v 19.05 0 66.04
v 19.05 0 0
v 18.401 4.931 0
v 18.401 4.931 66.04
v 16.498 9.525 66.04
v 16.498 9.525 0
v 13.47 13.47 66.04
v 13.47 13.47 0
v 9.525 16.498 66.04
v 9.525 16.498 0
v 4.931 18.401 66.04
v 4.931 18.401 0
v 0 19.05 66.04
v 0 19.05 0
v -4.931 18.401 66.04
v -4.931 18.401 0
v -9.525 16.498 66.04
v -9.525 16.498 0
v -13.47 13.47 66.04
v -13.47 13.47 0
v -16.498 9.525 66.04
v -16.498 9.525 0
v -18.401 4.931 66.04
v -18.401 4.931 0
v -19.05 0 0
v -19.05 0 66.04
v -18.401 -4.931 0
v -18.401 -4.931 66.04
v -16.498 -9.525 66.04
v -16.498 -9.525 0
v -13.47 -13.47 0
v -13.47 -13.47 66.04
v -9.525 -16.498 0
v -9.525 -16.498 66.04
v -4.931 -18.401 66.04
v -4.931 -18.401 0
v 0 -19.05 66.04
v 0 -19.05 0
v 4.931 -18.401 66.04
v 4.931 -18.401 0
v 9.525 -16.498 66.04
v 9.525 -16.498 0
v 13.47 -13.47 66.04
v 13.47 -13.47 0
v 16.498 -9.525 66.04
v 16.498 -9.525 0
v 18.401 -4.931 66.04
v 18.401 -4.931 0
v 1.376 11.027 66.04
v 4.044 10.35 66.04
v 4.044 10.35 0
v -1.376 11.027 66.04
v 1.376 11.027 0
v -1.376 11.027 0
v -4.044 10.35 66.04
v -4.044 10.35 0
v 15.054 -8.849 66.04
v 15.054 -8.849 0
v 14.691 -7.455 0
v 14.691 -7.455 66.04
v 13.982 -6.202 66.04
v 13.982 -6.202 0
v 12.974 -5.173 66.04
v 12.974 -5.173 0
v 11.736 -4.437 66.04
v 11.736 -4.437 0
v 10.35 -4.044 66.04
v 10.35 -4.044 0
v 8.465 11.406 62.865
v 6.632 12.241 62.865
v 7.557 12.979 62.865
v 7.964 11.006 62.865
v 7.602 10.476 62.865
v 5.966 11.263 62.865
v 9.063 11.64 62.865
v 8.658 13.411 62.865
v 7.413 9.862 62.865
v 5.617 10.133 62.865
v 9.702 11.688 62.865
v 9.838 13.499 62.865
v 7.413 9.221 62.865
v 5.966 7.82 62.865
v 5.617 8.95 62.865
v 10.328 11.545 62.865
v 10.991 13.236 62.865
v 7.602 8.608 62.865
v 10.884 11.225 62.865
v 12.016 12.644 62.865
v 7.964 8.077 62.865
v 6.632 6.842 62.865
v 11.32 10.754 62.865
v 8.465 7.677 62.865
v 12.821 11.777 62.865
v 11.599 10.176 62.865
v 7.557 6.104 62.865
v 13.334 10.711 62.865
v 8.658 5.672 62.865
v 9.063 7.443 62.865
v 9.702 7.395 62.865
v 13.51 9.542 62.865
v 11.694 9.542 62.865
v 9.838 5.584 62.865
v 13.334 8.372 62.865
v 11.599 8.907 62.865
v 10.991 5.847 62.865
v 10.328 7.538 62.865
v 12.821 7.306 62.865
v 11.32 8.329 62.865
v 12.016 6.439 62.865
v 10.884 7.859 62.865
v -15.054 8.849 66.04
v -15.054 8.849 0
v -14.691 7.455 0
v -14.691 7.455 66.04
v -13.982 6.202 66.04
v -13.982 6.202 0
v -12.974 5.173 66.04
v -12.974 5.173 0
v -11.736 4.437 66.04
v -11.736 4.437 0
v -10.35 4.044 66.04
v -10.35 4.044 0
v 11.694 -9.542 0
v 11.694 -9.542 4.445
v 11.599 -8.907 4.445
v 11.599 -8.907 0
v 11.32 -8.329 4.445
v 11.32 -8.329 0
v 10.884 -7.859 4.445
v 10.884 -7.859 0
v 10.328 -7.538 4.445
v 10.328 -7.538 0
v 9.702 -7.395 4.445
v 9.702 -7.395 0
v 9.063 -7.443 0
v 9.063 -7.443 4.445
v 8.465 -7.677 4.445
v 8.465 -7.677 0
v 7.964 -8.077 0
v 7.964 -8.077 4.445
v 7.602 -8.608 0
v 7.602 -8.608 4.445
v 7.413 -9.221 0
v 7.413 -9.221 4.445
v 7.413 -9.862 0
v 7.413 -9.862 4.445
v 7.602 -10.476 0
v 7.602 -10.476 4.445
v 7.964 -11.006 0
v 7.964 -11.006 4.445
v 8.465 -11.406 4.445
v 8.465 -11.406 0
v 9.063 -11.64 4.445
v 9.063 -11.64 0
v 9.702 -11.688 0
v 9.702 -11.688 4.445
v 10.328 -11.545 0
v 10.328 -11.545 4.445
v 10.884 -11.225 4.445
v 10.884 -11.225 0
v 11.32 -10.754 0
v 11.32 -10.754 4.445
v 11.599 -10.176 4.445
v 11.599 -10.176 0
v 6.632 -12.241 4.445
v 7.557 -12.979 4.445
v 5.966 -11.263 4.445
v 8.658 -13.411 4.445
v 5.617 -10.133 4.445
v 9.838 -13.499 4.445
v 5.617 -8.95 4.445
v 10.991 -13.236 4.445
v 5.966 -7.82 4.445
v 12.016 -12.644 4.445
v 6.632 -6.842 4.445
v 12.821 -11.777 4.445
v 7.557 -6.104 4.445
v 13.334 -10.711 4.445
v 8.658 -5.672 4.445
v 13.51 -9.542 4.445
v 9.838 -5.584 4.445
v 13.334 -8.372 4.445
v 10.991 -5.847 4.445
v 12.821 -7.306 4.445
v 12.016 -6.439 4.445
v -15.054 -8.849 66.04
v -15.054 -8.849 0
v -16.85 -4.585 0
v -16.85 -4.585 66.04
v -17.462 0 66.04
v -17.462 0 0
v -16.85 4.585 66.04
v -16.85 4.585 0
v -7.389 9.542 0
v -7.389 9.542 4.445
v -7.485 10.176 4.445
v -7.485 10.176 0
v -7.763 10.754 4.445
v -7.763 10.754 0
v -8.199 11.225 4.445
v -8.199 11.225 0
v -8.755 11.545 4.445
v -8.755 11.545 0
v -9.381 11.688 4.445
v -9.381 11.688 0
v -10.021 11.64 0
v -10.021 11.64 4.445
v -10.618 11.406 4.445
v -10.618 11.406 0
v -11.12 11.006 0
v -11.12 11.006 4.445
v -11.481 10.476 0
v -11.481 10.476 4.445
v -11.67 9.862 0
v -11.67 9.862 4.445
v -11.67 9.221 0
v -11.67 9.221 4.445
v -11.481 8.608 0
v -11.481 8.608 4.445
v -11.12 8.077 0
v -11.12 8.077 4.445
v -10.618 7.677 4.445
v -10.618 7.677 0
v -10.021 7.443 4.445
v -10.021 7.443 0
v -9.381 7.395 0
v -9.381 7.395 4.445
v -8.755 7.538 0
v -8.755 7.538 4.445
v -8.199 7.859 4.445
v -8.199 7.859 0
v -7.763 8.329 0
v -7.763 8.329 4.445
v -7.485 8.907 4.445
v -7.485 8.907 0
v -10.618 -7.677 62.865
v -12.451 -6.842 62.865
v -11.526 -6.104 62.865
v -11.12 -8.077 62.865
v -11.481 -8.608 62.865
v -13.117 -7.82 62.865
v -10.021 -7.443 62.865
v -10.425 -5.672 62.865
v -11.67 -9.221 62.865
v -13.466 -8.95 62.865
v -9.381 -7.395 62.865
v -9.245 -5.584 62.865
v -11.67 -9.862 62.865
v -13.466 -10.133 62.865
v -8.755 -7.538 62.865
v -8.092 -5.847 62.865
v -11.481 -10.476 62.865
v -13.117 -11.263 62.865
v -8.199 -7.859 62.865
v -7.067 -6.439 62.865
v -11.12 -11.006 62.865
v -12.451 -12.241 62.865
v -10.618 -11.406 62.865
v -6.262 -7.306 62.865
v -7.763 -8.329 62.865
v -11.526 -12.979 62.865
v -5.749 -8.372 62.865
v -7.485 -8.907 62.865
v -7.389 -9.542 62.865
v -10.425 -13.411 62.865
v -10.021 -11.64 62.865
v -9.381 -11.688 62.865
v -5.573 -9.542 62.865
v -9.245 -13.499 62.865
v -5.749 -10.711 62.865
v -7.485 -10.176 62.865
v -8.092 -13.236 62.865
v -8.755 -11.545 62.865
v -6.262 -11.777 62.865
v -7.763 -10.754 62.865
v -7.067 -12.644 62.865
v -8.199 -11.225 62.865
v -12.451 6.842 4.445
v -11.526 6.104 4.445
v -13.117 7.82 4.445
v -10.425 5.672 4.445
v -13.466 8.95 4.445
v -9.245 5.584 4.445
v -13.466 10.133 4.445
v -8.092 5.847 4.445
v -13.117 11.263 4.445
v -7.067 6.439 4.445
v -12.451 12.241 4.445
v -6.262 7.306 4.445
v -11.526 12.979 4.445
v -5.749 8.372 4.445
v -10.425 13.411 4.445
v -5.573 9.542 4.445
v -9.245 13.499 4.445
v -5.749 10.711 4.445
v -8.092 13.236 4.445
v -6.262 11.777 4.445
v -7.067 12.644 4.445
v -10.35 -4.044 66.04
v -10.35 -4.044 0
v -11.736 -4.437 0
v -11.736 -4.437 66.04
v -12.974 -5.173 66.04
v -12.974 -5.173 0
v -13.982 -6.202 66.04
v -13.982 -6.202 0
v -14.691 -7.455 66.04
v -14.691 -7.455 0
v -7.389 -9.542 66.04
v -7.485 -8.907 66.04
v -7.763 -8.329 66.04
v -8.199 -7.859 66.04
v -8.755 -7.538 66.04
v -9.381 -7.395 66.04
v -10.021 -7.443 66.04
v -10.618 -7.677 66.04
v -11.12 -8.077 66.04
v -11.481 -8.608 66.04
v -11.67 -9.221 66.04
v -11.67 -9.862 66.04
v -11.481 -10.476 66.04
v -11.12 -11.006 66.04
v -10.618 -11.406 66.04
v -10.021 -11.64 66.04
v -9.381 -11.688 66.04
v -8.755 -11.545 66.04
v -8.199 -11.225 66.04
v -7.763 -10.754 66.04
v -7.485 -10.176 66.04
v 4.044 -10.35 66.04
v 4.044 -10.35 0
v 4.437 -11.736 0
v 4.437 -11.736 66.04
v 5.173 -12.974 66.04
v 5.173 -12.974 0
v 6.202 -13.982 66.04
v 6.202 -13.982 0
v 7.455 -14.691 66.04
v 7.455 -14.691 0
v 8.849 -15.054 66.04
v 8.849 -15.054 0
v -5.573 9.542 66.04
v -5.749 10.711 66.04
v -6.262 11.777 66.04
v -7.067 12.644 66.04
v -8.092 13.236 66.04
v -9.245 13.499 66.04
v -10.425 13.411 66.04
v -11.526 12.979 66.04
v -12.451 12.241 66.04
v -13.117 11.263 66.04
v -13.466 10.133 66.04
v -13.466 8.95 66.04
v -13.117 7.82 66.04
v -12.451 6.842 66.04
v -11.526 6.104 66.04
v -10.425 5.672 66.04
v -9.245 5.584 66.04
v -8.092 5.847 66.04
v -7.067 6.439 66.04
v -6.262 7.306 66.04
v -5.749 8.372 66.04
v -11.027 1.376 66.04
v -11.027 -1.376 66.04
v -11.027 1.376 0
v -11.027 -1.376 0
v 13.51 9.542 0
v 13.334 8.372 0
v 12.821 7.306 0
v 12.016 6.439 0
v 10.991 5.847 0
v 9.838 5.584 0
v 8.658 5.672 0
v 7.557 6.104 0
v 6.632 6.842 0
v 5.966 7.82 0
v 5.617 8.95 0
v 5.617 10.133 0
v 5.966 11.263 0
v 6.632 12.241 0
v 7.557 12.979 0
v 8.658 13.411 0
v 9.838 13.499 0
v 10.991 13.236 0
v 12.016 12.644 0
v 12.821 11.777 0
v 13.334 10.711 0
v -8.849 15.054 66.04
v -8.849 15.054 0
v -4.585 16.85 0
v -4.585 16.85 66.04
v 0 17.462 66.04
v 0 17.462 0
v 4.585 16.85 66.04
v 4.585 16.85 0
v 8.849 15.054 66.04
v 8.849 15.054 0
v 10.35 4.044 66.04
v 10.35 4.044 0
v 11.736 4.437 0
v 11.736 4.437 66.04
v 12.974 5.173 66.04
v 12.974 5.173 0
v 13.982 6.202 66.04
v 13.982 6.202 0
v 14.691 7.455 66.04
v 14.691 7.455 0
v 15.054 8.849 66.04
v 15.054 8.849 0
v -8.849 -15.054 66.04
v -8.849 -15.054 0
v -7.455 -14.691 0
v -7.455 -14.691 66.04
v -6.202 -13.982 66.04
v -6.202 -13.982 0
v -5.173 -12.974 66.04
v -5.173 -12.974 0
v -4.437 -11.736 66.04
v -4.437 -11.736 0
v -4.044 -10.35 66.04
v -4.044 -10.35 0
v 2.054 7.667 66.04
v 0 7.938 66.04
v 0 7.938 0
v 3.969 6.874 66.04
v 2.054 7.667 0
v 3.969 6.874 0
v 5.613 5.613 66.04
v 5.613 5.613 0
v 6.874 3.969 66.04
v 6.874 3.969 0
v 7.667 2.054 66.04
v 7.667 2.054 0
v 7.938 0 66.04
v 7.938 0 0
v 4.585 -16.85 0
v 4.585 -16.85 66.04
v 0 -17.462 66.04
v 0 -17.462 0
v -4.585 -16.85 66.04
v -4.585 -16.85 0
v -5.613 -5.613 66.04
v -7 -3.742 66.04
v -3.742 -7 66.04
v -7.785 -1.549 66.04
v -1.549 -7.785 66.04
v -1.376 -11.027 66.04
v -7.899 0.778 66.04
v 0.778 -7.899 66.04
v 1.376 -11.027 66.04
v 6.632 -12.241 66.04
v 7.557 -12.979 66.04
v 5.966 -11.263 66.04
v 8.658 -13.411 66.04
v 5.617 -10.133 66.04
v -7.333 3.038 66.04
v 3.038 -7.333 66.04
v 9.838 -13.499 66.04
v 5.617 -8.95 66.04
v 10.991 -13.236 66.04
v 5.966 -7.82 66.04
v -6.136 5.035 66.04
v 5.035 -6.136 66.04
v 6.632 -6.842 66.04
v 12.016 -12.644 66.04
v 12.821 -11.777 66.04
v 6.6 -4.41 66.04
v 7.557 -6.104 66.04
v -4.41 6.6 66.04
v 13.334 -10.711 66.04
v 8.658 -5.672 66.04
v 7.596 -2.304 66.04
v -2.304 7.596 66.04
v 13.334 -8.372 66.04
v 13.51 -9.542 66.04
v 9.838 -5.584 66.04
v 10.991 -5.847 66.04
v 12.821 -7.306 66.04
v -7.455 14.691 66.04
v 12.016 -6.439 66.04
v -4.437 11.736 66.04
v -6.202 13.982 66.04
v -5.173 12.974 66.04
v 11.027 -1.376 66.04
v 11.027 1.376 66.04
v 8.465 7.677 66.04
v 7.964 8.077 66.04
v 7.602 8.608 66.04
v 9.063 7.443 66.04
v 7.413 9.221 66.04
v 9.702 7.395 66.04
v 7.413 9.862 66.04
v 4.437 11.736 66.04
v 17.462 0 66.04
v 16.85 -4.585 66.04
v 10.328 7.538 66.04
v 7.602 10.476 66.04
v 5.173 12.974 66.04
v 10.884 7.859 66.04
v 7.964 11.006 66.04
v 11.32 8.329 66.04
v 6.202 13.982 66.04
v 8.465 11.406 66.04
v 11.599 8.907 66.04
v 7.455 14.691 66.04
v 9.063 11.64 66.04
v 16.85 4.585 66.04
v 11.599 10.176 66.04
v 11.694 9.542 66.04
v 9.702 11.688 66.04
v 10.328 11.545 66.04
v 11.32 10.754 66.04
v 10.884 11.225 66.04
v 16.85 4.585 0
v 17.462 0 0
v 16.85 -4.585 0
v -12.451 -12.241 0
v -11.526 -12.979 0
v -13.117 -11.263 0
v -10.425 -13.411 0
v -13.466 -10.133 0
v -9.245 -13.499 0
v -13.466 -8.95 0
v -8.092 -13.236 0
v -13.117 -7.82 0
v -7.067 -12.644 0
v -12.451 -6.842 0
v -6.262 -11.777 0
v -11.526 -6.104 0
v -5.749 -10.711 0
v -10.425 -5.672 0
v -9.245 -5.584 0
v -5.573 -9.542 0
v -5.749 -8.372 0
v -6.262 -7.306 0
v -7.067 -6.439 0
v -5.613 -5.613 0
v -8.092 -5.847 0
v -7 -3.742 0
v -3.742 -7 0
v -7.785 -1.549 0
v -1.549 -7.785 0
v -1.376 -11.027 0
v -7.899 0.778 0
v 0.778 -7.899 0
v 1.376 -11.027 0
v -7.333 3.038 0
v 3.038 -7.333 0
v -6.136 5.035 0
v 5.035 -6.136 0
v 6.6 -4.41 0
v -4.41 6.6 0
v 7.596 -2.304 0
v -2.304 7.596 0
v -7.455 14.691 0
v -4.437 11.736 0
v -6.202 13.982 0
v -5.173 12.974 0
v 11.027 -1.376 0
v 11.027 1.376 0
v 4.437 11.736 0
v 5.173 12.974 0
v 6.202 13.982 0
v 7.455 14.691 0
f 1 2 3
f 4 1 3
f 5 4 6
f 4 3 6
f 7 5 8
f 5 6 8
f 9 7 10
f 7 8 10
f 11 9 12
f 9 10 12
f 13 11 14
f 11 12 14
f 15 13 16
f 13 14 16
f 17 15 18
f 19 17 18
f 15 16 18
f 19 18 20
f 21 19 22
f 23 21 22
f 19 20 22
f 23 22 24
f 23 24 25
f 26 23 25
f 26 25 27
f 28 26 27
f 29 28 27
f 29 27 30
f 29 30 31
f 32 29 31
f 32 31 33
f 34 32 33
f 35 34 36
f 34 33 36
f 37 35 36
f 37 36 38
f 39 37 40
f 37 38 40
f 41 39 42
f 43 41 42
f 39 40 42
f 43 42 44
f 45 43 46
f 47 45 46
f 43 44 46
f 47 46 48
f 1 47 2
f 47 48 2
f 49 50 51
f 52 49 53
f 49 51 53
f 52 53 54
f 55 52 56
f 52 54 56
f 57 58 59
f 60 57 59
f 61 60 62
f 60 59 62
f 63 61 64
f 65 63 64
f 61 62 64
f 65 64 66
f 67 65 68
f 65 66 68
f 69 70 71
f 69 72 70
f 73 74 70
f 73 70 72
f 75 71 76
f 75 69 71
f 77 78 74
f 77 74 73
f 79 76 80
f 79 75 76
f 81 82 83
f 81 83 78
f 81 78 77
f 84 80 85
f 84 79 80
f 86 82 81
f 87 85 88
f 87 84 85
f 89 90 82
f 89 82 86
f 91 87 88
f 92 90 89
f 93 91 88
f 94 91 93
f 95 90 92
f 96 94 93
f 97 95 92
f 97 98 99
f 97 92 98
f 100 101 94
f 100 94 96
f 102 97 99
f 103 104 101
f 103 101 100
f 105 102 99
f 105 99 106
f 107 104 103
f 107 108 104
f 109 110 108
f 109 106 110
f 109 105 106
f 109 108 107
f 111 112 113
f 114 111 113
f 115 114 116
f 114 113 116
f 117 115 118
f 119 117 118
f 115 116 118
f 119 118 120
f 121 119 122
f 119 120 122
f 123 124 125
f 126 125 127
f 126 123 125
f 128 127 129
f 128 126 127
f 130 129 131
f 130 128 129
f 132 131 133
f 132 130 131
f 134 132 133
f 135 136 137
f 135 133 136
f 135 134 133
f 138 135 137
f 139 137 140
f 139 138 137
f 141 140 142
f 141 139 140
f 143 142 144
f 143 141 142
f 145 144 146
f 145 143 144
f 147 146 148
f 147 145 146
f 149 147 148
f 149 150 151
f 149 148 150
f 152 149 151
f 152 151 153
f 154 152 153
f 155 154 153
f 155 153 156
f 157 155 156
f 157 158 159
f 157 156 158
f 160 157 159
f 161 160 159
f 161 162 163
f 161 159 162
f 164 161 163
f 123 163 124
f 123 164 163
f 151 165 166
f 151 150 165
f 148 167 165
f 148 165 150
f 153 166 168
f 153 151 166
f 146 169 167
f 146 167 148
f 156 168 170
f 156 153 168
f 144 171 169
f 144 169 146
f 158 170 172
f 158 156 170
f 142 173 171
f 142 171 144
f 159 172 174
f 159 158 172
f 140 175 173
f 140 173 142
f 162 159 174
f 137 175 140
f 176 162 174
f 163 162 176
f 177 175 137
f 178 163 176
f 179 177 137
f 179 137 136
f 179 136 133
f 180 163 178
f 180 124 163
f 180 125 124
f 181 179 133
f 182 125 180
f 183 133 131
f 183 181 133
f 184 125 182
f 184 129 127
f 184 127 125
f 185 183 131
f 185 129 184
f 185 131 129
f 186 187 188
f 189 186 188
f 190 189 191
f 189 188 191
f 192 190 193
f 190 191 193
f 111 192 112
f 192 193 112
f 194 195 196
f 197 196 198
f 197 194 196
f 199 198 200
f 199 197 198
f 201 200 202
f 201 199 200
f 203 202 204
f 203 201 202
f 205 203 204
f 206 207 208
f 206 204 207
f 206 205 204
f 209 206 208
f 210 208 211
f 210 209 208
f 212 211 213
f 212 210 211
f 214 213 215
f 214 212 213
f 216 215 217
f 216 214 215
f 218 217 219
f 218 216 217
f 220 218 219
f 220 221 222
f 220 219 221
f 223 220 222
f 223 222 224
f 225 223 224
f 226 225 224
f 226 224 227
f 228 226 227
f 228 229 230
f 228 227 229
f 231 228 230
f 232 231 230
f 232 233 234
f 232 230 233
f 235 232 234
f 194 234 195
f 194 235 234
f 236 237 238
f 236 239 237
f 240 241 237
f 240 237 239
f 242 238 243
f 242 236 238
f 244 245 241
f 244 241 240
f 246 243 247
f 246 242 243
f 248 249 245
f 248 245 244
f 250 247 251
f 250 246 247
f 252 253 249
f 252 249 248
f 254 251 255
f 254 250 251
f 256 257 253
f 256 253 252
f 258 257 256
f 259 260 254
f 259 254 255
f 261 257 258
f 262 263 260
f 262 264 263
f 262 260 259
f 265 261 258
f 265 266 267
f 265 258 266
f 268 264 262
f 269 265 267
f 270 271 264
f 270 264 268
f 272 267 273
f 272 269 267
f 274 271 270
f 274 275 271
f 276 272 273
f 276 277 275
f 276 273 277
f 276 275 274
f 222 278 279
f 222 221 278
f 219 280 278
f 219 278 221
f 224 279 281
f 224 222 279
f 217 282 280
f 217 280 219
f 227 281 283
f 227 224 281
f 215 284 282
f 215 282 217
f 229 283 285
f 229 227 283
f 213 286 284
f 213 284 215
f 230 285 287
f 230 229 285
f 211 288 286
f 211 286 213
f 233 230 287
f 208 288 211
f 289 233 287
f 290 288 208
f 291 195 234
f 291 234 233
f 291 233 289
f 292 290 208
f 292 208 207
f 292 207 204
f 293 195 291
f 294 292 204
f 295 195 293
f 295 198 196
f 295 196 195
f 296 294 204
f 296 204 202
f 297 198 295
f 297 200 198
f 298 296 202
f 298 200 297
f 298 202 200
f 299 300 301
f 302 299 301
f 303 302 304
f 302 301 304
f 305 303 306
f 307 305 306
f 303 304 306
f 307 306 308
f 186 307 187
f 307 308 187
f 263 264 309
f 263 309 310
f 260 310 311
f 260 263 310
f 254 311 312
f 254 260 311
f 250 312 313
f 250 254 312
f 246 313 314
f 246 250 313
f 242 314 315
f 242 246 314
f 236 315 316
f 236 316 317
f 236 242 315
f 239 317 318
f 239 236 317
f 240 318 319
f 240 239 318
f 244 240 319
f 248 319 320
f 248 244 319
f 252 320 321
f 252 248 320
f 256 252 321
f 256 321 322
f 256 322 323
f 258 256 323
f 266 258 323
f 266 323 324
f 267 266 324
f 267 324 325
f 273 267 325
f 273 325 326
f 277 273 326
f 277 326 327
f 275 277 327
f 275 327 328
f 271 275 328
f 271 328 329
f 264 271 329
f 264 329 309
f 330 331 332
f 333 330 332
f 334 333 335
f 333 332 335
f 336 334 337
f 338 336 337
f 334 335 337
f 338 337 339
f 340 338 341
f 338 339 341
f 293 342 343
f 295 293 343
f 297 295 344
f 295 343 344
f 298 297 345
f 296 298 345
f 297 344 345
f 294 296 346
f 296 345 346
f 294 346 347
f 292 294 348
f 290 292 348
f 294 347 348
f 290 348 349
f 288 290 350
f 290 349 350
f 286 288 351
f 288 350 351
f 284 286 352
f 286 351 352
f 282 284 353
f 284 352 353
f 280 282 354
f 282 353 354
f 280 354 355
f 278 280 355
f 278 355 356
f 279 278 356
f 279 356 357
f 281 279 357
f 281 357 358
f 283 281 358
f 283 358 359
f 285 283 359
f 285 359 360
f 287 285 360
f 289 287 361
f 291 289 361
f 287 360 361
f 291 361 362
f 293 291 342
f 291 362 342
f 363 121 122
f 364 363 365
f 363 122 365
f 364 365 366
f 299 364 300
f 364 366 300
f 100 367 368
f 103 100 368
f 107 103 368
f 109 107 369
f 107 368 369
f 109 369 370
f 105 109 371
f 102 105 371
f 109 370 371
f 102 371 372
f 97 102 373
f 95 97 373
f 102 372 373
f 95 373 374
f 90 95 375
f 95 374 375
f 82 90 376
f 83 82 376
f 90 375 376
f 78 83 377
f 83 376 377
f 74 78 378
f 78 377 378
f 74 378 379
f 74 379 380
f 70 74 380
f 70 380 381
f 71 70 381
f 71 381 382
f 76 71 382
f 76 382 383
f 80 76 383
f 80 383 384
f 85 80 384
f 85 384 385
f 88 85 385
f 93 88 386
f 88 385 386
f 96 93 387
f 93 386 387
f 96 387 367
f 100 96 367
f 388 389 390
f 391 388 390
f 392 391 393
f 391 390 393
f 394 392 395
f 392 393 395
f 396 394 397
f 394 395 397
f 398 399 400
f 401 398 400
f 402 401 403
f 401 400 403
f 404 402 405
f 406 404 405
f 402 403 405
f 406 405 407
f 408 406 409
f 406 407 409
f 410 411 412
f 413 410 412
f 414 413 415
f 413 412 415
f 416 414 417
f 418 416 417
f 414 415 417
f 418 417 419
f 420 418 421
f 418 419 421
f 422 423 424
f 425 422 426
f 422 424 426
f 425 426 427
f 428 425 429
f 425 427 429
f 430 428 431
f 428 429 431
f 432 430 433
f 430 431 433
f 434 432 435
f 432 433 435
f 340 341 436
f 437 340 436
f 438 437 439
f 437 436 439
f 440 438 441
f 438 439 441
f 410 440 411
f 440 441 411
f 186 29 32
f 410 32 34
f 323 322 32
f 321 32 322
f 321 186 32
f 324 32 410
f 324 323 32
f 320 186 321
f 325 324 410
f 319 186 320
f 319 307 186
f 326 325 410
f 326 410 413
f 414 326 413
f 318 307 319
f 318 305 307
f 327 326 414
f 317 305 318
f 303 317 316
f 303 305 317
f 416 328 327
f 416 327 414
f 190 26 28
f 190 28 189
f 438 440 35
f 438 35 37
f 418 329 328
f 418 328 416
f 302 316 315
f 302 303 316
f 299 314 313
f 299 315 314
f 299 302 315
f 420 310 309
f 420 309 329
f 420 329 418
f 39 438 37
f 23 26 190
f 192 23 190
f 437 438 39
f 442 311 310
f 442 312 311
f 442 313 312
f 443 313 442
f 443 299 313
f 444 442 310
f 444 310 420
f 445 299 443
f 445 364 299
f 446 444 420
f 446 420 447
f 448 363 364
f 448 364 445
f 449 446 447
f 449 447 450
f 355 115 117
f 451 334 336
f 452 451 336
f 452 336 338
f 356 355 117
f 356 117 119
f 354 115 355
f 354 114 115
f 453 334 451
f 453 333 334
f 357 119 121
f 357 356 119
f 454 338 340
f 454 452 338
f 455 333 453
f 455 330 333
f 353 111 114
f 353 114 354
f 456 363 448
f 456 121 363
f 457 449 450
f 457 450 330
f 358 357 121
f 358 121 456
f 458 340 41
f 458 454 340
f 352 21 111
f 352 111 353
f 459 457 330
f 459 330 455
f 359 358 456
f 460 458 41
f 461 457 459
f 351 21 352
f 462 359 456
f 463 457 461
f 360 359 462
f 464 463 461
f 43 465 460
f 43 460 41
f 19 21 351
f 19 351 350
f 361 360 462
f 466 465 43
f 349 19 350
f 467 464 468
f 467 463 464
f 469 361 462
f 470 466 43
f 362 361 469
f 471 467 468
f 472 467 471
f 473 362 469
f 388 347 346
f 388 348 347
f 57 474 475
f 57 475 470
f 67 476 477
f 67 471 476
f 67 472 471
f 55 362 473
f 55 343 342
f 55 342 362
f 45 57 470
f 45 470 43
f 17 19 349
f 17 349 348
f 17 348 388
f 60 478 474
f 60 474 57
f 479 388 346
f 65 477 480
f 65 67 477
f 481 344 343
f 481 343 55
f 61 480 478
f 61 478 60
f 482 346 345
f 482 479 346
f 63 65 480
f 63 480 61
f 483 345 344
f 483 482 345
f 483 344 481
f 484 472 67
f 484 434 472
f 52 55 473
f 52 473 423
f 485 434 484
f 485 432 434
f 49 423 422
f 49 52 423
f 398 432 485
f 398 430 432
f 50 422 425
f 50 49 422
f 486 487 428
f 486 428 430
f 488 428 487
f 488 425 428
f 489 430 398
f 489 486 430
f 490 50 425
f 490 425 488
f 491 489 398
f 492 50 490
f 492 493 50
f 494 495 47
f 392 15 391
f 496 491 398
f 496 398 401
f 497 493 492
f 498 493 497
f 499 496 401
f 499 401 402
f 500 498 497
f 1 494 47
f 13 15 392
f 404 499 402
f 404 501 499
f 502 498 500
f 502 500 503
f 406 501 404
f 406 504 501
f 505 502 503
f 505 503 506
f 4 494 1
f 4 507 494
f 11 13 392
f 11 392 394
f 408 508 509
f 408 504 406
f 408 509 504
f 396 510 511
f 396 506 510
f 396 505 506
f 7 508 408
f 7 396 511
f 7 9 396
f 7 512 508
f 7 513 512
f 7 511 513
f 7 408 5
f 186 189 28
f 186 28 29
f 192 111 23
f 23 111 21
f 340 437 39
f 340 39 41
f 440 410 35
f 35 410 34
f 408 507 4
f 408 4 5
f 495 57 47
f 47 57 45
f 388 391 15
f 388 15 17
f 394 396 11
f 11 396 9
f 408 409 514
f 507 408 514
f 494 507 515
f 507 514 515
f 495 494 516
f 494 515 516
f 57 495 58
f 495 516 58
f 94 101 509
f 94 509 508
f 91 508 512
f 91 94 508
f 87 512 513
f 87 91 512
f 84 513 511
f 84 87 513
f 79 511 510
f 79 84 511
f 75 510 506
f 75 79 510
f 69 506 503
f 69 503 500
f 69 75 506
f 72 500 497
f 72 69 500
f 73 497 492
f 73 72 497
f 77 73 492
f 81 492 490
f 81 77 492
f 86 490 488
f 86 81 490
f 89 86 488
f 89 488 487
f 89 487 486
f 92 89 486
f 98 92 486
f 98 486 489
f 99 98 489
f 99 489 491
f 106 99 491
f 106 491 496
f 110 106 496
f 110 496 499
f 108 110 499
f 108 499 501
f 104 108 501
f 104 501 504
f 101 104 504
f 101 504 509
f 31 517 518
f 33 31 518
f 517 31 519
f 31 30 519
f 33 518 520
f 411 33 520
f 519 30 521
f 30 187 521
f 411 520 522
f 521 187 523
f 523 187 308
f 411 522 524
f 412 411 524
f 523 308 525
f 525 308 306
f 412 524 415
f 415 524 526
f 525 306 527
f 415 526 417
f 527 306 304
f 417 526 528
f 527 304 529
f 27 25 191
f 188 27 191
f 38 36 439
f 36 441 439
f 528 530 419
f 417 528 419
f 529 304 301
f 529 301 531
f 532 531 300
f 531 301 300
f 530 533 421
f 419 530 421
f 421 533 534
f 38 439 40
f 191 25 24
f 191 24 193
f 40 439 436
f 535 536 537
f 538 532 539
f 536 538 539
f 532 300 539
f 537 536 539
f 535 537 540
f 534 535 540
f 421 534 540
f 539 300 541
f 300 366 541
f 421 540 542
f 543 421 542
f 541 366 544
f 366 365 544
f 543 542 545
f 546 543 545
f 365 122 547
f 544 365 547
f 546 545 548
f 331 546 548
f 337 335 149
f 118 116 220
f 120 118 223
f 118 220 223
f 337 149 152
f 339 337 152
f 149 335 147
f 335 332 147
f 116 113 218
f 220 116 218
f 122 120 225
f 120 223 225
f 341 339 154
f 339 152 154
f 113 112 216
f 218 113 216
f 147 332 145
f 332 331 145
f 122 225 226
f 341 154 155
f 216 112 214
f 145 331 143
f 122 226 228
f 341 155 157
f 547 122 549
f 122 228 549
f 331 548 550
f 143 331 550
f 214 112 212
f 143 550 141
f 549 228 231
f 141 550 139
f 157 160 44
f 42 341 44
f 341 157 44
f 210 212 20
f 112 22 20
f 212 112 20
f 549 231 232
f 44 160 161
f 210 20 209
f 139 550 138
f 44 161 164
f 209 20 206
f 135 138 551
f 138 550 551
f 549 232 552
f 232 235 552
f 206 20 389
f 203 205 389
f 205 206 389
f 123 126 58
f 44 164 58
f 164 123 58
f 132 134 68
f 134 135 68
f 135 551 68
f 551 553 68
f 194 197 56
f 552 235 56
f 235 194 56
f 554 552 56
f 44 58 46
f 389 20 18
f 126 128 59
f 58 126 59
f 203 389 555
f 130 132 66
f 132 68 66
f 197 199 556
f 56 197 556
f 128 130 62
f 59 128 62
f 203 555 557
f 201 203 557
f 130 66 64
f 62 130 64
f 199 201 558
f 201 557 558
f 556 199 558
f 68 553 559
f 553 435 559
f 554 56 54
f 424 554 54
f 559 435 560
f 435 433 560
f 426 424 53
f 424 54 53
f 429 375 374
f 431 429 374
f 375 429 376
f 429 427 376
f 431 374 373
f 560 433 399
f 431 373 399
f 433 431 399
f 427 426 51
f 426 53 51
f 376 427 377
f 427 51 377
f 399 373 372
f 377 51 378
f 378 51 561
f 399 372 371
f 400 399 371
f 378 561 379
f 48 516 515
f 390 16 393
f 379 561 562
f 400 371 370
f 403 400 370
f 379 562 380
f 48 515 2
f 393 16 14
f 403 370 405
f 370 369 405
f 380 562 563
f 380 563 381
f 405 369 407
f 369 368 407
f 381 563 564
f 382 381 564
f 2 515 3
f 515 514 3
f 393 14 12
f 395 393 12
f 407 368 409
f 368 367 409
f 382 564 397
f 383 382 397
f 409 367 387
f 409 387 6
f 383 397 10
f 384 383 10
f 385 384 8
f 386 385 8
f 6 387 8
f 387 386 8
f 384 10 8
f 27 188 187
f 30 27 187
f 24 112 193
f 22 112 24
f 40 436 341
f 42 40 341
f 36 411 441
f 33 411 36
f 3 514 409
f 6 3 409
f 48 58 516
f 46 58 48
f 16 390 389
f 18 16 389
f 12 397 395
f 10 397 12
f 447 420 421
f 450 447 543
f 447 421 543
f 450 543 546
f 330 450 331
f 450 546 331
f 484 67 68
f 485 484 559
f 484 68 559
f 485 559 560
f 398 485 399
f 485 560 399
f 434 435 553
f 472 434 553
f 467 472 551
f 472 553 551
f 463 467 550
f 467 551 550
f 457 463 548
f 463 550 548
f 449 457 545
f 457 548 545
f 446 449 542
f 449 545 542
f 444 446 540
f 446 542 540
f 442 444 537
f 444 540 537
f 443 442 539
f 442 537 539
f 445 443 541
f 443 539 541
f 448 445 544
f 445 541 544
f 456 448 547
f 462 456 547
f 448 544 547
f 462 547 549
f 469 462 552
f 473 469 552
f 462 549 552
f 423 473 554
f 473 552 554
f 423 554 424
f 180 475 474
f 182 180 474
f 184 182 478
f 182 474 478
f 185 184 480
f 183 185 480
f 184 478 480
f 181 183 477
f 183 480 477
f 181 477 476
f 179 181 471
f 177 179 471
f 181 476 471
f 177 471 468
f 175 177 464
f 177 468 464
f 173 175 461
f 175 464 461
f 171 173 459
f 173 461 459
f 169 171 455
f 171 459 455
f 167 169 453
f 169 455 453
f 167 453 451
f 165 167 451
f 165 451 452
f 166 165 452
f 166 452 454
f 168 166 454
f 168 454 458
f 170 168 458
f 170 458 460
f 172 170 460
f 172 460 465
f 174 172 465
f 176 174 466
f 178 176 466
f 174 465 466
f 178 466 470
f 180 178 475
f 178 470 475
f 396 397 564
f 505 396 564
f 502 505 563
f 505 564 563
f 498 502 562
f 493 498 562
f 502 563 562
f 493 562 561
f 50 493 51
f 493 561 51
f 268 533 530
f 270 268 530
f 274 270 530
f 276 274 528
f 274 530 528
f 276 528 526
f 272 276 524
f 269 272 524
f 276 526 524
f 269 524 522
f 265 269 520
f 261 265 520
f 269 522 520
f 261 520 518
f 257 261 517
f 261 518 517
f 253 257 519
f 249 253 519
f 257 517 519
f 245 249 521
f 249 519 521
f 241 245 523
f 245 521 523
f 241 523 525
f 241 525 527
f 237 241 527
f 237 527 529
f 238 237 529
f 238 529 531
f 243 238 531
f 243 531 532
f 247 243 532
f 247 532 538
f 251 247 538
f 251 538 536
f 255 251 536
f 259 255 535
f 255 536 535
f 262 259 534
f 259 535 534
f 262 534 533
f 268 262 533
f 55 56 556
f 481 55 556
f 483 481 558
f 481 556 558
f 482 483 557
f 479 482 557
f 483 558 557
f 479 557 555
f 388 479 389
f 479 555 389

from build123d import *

# Parameters (mm, degrees)
F0_R      = 19.05
F0_R_2    = 2.15265
F1_DEPTH  = 66.04
F4_R      = 3.96875
F5_DEPTH  = 62.865
F6_R      = 3.96875
F7_DEPTH  = 61.595
F9_DEPTH  = 66.04
F10_COUNT = 4
F10_ANGLE = 270


with BuildPart() as f1:
    # F0 (on Top) → F1 (new body)
    with BuildSketch(Plane.XY):
        Circle(F0_R)
        with Locations((-9.5415221286, -9.5415221286)):
            Circle(F0_R_2, mode=Mode.SUBTRACT)
        with Locations((9.5415221286, -9.5415221286)):
            Circle(F0_R_2, mode=Mode.SUBTRACT)
        with Locations((-9.5415221286, 9.5415221286)):
            Circle(F0_R_2, mode=Mode.SUBTRACT)
        with BuildLine():
            ThreePointArc((0, 7.9375), (5.6126600757, 5.6126600757), (7.9375, 0))
            ThreePointArc((7.9375, 0), (-5.6126600757, -5.6126600757), (0, 7.9375))
        make_face(mode=Mode.SUBTRACT)
        with Locations((9.5415221286, 9.5415221286)):
            Circle(F0_R_2, mode=Mode.SUBTRACT)
    extrude(amount=F1_DEPTH)

    # F4 (on face) → F5 (cut, through all)
    with BuildSketch(Plane(origin=(0, 0, 0), x_dir=(1, 0, 0), z_dir=(0, 0, -1))):
        with Locations((9.5415221286, -9.5415221286)):
            Circle(F4_R)
        with Locations((-9.5415221286, 9.5415221286)):
            Circle(F4_R)
    extrude(amount=-F5_DEPTH, mode=Mode.SUBTRACT)

    # F6 (on face) → F7 (cut, through all)
    with BuildSketch(Plane.XY.offset(66.04)):
        with Locations((-9.5415221286, 9.5415221286)):
            Circle(F6_R)
        with Locations((9.5415221286, -9.5415221286)):
            Circle(F6_R)
    extrude(amount=-F7_DEPTH, mode=Mode.SUBTRACT)

    # F8 (on face) → F9 (cut, through all)
    with BuildSketch(Plane(origin=(0, 0, 0), x_dir=(1, 0, 0), z_dir=(0, 0, -1))):
        with BuildLine():
            ThreePointArc((8.8488960712, -15.0544327217), (5.6543471209, -13.5116335278), (4.0444600337, -10.350362278))
            ThreePointArc((4.0444600337, -10.350362278), (0, -11.1125), (-4.0444600337, -10.350362278))
            ThreePointArc((-4.0444600337, -10.350362278), (-5.6543471209, -13.5116335278), (-8.8488960712, -15.0544327217))
            ThreePointArc((-8.8488960712, -15.0544327217), (0, -17.4625), (8.8488960712, -15.0544327217))
        make_face()
    f9 = extrude(amount=-F9_DEPTH, mode=Mode.SUBTRACT)

    # F10: F9 ×4 about axis
    f10_axis = Axis((0, 0, 0), (0, 0, -1))
    for i in range(1, F10_COUNT):
        add(f9.rotate(f10_axis, i * F10_ANGLE / (F10_COUNT - 1)), mode=Mode.SUBTRACT)


solid = f1.part
